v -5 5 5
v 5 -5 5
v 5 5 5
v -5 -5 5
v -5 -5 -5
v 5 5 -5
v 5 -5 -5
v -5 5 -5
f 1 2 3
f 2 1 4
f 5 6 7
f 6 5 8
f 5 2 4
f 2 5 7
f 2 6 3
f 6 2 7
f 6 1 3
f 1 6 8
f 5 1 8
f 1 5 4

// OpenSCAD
// Generated by Mecha (https://github.com/tomahawkins/mecha)

color([0.5, 0.5, 0.5, 1.0]) translate ([-5.0, -5.0, -5.0]) cube(size = [10.0, 10.0, 10.0], center = false);
